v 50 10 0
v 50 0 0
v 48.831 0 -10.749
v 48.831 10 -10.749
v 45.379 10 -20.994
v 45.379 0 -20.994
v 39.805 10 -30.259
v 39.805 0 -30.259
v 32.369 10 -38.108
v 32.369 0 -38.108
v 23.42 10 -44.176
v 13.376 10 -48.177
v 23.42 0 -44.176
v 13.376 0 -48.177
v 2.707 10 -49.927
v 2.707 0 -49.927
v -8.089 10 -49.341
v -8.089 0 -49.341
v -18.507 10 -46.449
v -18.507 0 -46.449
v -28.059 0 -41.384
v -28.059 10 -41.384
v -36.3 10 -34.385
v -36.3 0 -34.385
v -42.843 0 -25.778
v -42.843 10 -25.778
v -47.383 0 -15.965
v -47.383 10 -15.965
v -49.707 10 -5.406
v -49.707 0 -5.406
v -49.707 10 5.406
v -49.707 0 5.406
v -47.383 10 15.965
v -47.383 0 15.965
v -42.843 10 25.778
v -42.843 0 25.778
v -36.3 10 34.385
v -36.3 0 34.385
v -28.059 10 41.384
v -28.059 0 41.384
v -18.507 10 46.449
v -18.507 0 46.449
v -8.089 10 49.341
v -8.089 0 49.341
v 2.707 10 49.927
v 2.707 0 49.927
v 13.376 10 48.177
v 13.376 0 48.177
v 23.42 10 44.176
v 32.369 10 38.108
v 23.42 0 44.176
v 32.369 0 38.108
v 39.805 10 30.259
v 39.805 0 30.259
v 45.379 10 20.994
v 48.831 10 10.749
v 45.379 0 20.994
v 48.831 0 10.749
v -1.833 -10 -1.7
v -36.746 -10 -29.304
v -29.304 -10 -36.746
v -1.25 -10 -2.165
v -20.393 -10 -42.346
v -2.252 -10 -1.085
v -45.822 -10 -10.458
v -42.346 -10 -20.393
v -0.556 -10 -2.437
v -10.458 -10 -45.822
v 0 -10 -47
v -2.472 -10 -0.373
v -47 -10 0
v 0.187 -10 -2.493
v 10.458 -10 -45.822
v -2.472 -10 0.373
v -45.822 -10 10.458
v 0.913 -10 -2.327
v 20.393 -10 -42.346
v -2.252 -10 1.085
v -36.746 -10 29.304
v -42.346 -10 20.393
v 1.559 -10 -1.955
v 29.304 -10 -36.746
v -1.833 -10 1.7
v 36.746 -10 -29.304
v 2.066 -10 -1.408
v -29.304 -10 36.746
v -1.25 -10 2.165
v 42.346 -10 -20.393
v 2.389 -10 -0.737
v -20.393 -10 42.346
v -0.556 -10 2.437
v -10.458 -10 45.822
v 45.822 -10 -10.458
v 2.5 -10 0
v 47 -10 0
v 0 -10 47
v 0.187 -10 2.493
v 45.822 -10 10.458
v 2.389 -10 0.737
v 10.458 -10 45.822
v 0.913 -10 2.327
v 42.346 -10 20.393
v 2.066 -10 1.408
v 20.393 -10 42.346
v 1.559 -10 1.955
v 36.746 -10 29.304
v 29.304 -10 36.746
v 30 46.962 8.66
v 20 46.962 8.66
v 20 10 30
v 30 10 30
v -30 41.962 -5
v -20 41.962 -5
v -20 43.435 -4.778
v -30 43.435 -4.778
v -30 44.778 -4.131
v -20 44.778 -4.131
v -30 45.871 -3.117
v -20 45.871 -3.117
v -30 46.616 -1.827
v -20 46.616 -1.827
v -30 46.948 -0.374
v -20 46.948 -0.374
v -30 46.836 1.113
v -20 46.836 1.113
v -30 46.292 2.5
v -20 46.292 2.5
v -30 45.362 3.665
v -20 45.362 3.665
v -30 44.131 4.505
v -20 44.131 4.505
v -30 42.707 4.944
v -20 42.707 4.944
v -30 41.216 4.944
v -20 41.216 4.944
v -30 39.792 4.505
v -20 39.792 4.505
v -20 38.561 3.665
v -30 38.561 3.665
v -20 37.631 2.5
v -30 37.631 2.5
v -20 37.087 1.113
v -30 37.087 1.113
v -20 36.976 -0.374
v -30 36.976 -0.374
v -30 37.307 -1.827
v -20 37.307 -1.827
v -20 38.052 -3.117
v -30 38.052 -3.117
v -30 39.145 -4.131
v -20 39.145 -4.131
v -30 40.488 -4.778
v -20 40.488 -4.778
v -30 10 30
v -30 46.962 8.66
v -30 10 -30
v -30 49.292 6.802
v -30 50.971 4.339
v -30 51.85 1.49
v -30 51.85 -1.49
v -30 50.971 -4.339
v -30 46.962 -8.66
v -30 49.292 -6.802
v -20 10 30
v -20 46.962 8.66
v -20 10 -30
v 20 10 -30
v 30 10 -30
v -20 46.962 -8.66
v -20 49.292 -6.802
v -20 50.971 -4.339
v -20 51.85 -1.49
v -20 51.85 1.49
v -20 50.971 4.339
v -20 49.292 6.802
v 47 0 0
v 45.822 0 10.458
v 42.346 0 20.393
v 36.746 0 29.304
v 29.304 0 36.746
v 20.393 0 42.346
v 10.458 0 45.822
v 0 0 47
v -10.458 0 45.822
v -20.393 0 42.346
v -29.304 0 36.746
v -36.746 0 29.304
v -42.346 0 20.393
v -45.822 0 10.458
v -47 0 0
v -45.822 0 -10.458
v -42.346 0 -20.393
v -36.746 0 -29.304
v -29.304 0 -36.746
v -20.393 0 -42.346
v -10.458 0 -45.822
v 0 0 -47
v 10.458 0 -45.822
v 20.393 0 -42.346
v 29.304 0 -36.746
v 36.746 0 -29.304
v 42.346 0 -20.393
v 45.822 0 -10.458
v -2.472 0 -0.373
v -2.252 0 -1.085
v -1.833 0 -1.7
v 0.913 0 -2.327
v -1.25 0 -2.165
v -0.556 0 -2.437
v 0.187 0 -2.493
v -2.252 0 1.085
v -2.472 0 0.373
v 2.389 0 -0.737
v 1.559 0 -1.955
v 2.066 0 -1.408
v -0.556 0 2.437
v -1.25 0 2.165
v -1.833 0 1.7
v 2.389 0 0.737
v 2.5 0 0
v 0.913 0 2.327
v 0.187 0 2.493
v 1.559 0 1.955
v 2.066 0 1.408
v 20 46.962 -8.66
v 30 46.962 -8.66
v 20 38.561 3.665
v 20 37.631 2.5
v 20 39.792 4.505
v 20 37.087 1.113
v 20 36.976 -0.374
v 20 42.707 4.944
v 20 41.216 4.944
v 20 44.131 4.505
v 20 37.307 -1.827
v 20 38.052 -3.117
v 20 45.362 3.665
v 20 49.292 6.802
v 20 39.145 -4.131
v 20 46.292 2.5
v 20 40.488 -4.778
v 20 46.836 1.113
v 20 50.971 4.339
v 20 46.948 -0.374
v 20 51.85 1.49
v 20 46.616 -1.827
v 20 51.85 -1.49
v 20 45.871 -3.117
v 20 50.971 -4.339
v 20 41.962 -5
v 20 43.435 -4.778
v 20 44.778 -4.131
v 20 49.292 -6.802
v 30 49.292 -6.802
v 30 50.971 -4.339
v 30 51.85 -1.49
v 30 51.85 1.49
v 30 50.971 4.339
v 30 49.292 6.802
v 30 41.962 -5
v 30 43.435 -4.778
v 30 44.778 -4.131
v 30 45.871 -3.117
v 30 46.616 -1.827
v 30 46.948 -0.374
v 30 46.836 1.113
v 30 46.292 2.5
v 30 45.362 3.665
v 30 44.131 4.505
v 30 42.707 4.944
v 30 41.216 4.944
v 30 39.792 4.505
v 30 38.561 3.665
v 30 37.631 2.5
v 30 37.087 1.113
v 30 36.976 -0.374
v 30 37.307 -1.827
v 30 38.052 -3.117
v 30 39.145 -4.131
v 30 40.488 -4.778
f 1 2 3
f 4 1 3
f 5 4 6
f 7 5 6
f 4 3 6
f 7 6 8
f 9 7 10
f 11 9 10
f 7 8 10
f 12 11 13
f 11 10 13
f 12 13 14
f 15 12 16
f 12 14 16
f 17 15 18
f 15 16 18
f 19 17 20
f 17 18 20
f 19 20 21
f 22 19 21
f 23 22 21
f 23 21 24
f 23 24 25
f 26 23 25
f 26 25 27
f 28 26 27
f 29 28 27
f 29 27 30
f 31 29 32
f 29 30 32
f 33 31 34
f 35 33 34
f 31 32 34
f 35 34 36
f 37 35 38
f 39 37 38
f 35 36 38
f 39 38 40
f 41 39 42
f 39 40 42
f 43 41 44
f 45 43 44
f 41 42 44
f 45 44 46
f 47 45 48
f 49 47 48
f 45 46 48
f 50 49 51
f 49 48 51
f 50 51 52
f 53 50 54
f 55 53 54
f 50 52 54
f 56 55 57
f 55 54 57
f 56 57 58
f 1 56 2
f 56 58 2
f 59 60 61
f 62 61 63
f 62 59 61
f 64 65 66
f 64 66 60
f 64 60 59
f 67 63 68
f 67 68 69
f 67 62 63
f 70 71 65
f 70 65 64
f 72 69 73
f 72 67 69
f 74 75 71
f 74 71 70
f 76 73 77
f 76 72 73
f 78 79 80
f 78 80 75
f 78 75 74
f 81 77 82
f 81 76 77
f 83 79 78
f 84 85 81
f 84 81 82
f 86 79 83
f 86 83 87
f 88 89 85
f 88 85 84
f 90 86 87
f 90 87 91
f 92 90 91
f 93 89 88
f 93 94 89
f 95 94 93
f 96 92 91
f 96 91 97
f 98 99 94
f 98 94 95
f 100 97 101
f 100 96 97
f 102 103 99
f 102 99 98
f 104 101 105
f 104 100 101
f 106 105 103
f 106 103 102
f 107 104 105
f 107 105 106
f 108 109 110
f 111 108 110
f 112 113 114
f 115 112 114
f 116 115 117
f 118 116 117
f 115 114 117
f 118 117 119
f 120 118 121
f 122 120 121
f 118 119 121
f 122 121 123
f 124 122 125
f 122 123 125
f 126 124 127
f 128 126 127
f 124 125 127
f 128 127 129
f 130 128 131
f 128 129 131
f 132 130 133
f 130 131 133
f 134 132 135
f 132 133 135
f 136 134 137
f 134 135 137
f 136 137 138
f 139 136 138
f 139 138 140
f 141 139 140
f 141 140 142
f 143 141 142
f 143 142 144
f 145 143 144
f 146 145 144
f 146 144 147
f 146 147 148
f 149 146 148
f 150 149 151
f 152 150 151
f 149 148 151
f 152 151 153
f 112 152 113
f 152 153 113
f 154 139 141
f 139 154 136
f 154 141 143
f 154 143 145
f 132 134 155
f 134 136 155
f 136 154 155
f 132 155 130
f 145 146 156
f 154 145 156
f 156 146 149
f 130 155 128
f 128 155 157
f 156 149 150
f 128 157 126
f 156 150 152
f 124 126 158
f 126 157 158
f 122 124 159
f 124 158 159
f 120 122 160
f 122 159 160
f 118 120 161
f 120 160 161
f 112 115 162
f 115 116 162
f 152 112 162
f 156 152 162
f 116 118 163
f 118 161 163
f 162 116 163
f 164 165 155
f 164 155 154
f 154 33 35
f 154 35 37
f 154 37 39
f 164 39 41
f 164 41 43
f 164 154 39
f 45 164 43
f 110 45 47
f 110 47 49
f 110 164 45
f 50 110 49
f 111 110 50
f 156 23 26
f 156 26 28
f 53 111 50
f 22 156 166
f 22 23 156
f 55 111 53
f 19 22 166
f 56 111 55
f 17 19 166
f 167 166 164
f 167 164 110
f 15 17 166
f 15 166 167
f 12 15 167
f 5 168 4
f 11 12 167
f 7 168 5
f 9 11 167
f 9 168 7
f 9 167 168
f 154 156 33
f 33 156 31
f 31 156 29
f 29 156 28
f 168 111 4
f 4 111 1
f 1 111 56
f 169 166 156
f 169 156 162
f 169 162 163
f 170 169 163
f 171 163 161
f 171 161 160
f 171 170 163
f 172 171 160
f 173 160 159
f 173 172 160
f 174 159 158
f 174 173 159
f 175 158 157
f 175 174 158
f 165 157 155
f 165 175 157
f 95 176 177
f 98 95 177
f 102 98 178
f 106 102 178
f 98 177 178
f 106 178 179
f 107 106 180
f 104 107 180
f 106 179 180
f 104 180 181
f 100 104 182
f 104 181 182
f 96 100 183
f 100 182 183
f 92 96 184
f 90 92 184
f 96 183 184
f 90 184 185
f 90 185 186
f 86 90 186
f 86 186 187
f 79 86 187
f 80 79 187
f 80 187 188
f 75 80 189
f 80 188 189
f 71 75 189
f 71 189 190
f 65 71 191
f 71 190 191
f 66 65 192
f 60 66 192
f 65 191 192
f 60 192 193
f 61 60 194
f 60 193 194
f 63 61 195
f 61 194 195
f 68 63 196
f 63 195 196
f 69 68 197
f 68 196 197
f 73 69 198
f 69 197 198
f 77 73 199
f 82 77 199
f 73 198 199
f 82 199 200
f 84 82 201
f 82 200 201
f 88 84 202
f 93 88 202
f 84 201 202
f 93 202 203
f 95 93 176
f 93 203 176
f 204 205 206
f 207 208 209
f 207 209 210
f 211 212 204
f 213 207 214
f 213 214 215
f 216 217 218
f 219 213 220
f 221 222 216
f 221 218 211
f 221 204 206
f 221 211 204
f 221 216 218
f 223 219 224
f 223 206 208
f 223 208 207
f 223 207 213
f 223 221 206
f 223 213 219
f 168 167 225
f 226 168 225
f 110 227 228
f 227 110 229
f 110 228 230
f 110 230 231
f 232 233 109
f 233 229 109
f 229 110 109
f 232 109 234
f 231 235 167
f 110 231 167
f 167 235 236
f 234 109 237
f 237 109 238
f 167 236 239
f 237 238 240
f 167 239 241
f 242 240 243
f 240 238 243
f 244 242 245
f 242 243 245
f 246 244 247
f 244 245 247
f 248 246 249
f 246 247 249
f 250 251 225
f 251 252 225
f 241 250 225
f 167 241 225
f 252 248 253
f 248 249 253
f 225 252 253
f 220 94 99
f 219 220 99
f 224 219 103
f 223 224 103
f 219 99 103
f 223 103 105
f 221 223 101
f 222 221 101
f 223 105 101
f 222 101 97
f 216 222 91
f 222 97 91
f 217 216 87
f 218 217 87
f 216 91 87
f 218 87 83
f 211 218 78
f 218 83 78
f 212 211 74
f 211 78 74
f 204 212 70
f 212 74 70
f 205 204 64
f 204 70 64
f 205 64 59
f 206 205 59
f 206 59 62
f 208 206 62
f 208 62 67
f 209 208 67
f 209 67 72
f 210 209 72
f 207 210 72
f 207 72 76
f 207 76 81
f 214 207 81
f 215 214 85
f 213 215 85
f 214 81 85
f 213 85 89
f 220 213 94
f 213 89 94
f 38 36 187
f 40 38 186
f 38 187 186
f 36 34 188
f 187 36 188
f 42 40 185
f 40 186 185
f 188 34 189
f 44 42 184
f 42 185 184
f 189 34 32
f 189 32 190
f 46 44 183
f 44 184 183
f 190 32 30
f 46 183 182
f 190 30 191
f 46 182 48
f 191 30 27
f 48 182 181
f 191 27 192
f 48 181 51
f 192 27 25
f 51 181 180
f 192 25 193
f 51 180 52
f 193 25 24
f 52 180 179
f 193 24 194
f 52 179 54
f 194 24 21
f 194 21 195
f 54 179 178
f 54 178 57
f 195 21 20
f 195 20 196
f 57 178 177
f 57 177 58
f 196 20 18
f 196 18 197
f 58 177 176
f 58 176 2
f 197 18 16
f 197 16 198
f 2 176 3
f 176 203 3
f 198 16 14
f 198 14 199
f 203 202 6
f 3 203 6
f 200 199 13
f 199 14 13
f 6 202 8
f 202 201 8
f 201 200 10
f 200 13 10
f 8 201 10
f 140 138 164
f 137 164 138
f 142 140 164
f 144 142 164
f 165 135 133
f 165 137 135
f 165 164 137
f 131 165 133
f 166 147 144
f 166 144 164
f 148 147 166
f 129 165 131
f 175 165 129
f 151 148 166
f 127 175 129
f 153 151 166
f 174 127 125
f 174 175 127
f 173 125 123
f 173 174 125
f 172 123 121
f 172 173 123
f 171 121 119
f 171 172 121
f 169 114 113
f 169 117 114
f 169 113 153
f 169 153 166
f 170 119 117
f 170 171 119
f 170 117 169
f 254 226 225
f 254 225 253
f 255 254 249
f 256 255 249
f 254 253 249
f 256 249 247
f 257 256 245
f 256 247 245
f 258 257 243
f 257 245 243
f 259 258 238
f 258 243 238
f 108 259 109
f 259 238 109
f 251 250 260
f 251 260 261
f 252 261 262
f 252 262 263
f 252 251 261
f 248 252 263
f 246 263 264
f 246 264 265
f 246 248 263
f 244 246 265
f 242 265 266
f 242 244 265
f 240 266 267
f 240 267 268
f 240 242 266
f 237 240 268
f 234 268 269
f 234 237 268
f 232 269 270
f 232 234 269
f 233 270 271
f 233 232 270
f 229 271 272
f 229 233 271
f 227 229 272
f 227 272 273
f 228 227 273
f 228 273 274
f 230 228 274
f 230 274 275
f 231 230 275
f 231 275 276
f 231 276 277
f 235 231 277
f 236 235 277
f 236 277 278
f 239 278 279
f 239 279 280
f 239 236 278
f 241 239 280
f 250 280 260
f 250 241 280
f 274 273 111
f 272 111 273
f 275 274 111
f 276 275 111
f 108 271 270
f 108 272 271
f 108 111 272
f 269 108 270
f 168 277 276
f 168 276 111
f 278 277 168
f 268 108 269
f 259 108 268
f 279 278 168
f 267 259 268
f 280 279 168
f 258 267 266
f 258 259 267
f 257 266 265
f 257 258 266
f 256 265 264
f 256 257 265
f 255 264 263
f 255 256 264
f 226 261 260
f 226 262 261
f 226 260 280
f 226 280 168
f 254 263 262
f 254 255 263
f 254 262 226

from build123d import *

# Parameters (mm, degrees)
SKETCH1_R           = 50
BOSS_EXTRUDE1_DEPTH = 10
BOSS_EXTRUDE2_START = 20
SKETCH2_R           = 5
BOSS_EXTRUDE2_DEPTH = 10
BOSS_EXTRUDE3_START = -30
SKETCH2_2_R         = 5
BOSS_EXTRUDE3_DEPTH = 10
SKETCH3_R           = 47
BOSS_EXTRUDE4_DEPTH = 10
SKETCH4_R           = 2.5
CUT_EXTRUDE1_DEPTH  = 10


with BuildPart() as part:
    # Sketch1 → Boss-Extrude1 (new body)
    with BuildSketch(Plane(origin=(0, 0, 0), x_dir=(1, 0, 0), z_dir=(0, 1, 0))):
        Circle(SKETCH1_R)
    extrude(amount=BOSS_EXTRUDE1_DEPTH)

    # Sketch2 → Boss-Extrude2 (add)
    with BuildSketch(Plane(origin=(0, 0, 0), x_dir=(0, 0, -1), z_dir=(1, 0, 0)).offset(BOSS_EXTRUDE2_START)):
        with BuildLine():
            Line((30, 10), (8.660254038, 46.961524227))
            ThreePointArc((8.660254038, 46.961524227), (0, 51.961524227), (-8.660254038, 46.961524227))
            Line((-8.660254038, 46.961524227), (-30, 10))
            Line((-30, 10), (30, 10))
        make_face()
        with Locations((0, 41.961524227)):
            Circle(SKETCH2_R, mode=Mode.SUBTRACT)
    extrude(amount=BOSS_EXTRUDE2_DEPTH)

    # Sketch2<2> → Boss-Extrude3 (add)
    with BuildSketch(Plane(origin=(0, 0, 0), x_dir=(0, 0, -1), z_dir=(1, 0, 0)).offset(BOSS_EXTRUDE3_START)):
        with BuildLine():
            Line((30, 10), (8.660254038, 46.961524227))
            ThreePointArc((8.660254038, 46.961524227), (0, 51.961524227), (-8.660254038, 46.961524227))
            Line((-8.660254038, 46.961524227), (-30, 10))
            Line((-30, 10), (30, 10))
        make_face()
        with Locations((0, 41.961524227)):
            Circle(SKETCH2_2_R, mode=Mode.SUBTRACT)
    extrude(amount=BOSS_EXTRUDE3_DEPTH)

    # Sketch3 → Boss-Extrude4 (add)
    with BuildSketch(Plane.XZ):
        Circle(SKETCH3_R)
    extrude(amount=BOSS_EXTRUDE4_DEPTH)

    # Sketch4 → Cut-Extrude1 (cut)
    with BuildSketch(Plane.XZ.offset(10)):
        Circle(SKETCH4_R)
    extrude(amount=-CUT_EXTRUDE1_DEPTH, mode=Mode.SUBTRACT)


solid = part.part
